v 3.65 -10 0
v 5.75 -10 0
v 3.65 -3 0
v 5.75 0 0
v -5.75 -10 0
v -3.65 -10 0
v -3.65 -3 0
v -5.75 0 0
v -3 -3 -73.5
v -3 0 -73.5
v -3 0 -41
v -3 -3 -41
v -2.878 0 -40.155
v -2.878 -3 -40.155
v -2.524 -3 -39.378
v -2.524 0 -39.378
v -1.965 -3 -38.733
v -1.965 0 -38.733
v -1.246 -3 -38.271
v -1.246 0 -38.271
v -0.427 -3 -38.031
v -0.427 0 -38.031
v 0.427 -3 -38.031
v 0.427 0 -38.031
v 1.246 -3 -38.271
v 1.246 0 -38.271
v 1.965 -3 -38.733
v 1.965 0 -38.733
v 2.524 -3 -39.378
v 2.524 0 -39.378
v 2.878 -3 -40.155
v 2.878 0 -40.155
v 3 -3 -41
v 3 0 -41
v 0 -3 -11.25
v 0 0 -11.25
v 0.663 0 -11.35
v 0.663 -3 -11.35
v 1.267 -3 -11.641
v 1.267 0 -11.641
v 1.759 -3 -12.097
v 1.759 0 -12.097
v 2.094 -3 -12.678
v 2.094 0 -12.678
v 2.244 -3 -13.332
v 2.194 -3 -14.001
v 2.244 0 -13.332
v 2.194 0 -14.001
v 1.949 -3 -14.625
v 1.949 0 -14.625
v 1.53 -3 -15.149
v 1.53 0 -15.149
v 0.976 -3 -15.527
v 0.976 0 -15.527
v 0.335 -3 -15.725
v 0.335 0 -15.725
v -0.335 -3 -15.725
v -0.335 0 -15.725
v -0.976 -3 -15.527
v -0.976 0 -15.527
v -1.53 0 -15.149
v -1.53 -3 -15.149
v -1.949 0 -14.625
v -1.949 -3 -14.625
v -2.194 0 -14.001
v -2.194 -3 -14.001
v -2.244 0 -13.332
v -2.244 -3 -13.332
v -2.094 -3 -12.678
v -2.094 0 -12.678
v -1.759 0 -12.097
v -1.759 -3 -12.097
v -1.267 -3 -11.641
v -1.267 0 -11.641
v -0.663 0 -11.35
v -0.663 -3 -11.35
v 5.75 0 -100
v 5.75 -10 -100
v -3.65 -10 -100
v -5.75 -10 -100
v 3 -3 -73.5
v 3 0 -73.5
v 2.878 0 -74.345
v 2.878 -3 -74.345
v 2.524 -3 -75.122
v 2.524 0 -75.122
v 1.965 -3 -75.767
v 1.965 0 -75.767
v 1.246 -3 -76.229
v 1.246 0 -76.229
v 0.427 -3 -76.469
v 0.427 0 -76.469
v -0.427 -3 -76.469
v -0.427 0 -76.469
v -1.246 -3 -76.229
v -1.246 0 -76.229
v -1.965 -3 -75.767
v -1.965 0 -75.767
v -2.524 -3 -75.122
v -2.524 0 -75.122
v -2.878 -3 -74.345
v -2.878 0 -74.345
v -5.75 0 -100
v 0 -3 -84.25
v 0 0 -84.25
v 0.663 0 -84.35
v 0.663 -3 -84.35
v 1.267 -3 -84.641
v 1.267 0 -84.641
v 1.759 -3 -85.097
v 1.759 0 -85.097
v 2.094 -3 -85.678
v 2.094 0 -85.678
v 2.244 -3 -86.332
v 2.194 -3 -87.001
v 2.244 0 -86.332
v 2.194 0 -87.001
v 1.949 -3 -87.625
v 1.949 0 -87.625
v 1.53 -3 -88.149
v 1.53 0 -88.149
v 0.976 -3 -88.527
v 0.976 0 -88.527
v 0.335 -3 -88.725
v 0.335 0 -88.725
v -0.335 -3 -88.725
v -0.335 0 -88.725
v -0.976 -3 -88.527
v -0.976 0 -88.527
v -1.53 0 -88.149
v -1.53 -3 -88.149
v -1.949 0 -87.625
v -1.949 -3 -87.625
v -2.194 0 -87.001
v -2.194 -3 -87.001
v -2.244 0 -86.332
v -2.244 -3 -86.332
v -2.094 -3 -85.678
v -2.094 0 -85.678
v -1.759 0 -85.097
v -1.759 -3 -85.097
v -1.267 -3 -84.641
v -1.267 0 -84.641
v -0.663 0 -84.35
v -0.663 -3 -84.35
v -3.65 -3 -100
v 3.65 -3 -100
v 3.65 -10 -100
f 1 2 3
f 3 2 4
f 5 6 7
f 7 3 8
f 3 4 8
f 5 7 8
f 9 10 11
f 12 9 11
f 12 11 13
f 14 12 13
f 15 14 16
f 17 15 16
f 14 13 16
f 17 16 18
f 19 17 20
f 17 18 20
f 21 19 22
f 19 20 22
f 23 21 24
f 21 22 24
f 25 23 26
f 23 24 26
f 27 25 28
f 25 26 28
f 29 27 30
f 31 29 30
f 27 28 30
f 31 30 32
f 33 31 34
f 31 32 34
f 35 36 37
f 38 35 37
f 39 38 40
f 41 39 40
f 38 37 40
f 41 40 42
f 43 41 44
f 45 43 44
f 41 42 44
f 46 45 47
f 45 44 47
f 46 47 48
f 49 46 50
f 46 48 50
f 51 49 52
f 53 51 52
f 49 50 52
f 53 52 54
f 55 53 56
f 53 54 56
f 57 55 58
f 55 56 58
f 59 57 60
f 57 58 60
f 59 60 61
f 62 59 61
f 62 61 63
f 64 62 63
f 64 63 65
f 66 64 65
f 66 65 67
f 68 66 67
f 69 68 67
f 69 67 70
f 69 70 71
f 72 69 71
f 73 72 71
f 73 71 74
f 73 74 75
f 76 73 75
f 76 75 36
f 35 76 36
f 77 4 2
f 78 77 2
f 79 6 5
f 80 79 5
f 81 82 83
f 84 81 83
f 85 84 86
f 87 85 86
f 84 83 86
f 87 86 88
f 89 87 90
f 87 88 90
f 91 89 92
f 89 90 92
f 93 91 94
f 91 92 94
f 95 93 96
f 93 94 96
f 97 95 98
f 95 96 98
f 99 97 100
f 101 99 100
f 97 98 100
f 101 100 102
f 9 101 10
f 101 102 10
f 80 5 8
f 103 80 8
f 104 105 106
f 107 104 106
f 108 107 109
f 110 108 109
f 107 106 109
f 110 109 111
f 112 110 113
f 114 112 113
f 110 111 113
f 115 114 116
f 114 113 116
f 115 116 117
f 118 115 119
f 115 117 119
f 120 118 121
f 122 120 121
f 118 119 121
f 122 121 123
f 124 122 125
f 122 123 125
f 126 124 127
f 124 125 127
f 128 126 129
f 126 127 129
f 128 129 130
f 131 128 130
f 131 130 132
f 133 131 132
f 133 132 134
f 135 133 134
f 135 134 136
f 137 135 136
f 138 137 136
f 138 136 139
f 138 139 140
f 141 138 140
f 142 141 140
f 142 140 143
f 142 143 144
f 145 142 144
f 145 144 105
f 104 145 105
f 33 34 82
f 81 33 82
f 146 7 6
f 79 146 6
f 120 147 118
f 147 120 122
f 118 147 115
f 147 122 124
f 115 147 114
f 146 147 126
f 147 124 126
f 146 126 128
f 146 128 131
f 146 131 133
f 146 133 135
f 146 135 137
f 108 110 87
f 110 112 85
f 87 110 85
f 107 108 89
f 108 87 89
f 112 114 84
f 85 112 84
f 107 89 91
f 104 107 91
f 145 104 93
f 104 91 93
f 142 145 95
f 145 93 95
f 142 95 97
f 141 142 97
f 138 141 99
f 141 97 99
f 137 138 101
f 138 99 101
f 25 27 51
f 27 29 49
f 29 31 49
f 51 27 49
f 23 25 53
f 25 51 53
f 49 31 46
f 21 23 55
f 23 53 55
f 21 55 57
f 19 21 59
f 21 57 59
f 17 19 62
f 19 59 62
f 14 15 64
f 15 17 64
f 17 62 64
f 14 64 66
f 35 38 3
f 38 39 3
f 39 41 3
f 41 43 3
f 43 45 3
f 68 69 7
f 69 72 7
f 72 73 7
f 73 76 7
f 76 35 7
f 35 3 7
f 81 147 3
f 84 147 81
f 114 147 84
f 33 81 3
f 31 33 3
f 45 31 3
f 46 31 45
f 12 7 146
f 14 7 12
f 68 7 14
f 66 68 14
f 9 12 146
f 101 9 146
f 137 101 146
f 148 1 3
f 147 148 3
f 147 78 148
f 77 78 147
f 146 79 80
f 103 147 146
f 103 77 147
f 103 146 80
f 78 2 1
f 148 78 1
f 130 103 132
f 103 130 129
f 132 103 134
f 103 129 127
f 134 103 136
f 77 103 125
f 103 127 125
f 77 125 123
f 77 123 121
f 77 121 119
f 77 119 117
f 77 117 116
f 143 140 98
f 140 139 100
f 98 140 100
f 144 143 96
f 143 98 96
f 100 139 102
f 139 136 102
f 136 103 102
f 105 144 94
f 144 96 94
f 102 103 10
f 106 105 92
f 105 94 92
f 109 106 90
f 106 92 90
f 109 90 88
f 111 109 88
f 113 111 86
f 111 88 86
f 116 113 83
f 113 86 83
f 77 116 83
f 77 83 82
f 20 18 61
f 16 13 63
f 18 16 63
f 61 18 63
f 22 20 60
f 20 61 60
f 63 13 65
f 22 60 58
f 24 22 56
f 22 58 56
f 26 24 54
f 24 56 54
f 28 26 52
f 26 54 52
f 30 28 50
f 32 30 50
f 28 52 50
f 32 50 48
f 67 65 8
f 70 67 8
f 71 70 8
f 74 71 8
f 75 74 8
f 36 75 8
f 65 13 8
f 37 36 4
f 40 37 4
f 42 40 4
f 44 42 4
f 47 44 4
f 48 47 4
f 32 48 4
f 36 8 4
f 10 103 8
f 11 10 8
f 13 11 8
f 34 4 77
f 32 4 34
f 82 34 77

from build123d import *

# Parameters (mm, degrees)
BOSS_EXTRU_1_DEPTH      = 100
ESQUISSE2_R             = 2.25
ENL_V_MAT_EXTRU_1_DEPTH = 11


with BuildPart() as part:
    # Esquisse1 → Boss.-Extru.1 (new body)
    with BuildSketch(Plane.XY):
        Polygon((-5.75, 0), (5.75, 0), (5.75, -10), (3.65, -10), (3.65, -3), (-3.65, -3), (-3.65, -10), (-5.75, -10), align=None)
    extrude(amount=-BOSS_EXTRU_1_DEPTH)

    # Esquisse2 → Enlèv. mat.-Extru.1 (cut, through all)
    with BuildSketch(Plane(origin=(0, 0, 0), x_dir=(1, 0, 0), z_dir=(0, 1, 0))):
        with Locations(Location((0, 86.5, 0), (0, 0, 270))):  # turned: the seam where the file's is
            Circle(ESQUISSE2_R)
        with Locations(Location((0, 13.5, 0), (0, 0, 270))):  # turned: the seam where the file's is
            Circle(ESQUISSE2_R)
        with BuildLine():
            Line((-3, 73.5), (-3, 41))
            ThreePointArc((-3, 41), (0, 38), (3, 41))
            Line((3, 41), (3, 73.5))
            ThreePointArc((3, 73.5), (0, 76.5), (-3, 73.5))
        make_face()
    extrude(amount=-ENL_V_MAT_EXTRU_1_DEPTH, mode=Mode.SUBTRACT)


solid = part.part
